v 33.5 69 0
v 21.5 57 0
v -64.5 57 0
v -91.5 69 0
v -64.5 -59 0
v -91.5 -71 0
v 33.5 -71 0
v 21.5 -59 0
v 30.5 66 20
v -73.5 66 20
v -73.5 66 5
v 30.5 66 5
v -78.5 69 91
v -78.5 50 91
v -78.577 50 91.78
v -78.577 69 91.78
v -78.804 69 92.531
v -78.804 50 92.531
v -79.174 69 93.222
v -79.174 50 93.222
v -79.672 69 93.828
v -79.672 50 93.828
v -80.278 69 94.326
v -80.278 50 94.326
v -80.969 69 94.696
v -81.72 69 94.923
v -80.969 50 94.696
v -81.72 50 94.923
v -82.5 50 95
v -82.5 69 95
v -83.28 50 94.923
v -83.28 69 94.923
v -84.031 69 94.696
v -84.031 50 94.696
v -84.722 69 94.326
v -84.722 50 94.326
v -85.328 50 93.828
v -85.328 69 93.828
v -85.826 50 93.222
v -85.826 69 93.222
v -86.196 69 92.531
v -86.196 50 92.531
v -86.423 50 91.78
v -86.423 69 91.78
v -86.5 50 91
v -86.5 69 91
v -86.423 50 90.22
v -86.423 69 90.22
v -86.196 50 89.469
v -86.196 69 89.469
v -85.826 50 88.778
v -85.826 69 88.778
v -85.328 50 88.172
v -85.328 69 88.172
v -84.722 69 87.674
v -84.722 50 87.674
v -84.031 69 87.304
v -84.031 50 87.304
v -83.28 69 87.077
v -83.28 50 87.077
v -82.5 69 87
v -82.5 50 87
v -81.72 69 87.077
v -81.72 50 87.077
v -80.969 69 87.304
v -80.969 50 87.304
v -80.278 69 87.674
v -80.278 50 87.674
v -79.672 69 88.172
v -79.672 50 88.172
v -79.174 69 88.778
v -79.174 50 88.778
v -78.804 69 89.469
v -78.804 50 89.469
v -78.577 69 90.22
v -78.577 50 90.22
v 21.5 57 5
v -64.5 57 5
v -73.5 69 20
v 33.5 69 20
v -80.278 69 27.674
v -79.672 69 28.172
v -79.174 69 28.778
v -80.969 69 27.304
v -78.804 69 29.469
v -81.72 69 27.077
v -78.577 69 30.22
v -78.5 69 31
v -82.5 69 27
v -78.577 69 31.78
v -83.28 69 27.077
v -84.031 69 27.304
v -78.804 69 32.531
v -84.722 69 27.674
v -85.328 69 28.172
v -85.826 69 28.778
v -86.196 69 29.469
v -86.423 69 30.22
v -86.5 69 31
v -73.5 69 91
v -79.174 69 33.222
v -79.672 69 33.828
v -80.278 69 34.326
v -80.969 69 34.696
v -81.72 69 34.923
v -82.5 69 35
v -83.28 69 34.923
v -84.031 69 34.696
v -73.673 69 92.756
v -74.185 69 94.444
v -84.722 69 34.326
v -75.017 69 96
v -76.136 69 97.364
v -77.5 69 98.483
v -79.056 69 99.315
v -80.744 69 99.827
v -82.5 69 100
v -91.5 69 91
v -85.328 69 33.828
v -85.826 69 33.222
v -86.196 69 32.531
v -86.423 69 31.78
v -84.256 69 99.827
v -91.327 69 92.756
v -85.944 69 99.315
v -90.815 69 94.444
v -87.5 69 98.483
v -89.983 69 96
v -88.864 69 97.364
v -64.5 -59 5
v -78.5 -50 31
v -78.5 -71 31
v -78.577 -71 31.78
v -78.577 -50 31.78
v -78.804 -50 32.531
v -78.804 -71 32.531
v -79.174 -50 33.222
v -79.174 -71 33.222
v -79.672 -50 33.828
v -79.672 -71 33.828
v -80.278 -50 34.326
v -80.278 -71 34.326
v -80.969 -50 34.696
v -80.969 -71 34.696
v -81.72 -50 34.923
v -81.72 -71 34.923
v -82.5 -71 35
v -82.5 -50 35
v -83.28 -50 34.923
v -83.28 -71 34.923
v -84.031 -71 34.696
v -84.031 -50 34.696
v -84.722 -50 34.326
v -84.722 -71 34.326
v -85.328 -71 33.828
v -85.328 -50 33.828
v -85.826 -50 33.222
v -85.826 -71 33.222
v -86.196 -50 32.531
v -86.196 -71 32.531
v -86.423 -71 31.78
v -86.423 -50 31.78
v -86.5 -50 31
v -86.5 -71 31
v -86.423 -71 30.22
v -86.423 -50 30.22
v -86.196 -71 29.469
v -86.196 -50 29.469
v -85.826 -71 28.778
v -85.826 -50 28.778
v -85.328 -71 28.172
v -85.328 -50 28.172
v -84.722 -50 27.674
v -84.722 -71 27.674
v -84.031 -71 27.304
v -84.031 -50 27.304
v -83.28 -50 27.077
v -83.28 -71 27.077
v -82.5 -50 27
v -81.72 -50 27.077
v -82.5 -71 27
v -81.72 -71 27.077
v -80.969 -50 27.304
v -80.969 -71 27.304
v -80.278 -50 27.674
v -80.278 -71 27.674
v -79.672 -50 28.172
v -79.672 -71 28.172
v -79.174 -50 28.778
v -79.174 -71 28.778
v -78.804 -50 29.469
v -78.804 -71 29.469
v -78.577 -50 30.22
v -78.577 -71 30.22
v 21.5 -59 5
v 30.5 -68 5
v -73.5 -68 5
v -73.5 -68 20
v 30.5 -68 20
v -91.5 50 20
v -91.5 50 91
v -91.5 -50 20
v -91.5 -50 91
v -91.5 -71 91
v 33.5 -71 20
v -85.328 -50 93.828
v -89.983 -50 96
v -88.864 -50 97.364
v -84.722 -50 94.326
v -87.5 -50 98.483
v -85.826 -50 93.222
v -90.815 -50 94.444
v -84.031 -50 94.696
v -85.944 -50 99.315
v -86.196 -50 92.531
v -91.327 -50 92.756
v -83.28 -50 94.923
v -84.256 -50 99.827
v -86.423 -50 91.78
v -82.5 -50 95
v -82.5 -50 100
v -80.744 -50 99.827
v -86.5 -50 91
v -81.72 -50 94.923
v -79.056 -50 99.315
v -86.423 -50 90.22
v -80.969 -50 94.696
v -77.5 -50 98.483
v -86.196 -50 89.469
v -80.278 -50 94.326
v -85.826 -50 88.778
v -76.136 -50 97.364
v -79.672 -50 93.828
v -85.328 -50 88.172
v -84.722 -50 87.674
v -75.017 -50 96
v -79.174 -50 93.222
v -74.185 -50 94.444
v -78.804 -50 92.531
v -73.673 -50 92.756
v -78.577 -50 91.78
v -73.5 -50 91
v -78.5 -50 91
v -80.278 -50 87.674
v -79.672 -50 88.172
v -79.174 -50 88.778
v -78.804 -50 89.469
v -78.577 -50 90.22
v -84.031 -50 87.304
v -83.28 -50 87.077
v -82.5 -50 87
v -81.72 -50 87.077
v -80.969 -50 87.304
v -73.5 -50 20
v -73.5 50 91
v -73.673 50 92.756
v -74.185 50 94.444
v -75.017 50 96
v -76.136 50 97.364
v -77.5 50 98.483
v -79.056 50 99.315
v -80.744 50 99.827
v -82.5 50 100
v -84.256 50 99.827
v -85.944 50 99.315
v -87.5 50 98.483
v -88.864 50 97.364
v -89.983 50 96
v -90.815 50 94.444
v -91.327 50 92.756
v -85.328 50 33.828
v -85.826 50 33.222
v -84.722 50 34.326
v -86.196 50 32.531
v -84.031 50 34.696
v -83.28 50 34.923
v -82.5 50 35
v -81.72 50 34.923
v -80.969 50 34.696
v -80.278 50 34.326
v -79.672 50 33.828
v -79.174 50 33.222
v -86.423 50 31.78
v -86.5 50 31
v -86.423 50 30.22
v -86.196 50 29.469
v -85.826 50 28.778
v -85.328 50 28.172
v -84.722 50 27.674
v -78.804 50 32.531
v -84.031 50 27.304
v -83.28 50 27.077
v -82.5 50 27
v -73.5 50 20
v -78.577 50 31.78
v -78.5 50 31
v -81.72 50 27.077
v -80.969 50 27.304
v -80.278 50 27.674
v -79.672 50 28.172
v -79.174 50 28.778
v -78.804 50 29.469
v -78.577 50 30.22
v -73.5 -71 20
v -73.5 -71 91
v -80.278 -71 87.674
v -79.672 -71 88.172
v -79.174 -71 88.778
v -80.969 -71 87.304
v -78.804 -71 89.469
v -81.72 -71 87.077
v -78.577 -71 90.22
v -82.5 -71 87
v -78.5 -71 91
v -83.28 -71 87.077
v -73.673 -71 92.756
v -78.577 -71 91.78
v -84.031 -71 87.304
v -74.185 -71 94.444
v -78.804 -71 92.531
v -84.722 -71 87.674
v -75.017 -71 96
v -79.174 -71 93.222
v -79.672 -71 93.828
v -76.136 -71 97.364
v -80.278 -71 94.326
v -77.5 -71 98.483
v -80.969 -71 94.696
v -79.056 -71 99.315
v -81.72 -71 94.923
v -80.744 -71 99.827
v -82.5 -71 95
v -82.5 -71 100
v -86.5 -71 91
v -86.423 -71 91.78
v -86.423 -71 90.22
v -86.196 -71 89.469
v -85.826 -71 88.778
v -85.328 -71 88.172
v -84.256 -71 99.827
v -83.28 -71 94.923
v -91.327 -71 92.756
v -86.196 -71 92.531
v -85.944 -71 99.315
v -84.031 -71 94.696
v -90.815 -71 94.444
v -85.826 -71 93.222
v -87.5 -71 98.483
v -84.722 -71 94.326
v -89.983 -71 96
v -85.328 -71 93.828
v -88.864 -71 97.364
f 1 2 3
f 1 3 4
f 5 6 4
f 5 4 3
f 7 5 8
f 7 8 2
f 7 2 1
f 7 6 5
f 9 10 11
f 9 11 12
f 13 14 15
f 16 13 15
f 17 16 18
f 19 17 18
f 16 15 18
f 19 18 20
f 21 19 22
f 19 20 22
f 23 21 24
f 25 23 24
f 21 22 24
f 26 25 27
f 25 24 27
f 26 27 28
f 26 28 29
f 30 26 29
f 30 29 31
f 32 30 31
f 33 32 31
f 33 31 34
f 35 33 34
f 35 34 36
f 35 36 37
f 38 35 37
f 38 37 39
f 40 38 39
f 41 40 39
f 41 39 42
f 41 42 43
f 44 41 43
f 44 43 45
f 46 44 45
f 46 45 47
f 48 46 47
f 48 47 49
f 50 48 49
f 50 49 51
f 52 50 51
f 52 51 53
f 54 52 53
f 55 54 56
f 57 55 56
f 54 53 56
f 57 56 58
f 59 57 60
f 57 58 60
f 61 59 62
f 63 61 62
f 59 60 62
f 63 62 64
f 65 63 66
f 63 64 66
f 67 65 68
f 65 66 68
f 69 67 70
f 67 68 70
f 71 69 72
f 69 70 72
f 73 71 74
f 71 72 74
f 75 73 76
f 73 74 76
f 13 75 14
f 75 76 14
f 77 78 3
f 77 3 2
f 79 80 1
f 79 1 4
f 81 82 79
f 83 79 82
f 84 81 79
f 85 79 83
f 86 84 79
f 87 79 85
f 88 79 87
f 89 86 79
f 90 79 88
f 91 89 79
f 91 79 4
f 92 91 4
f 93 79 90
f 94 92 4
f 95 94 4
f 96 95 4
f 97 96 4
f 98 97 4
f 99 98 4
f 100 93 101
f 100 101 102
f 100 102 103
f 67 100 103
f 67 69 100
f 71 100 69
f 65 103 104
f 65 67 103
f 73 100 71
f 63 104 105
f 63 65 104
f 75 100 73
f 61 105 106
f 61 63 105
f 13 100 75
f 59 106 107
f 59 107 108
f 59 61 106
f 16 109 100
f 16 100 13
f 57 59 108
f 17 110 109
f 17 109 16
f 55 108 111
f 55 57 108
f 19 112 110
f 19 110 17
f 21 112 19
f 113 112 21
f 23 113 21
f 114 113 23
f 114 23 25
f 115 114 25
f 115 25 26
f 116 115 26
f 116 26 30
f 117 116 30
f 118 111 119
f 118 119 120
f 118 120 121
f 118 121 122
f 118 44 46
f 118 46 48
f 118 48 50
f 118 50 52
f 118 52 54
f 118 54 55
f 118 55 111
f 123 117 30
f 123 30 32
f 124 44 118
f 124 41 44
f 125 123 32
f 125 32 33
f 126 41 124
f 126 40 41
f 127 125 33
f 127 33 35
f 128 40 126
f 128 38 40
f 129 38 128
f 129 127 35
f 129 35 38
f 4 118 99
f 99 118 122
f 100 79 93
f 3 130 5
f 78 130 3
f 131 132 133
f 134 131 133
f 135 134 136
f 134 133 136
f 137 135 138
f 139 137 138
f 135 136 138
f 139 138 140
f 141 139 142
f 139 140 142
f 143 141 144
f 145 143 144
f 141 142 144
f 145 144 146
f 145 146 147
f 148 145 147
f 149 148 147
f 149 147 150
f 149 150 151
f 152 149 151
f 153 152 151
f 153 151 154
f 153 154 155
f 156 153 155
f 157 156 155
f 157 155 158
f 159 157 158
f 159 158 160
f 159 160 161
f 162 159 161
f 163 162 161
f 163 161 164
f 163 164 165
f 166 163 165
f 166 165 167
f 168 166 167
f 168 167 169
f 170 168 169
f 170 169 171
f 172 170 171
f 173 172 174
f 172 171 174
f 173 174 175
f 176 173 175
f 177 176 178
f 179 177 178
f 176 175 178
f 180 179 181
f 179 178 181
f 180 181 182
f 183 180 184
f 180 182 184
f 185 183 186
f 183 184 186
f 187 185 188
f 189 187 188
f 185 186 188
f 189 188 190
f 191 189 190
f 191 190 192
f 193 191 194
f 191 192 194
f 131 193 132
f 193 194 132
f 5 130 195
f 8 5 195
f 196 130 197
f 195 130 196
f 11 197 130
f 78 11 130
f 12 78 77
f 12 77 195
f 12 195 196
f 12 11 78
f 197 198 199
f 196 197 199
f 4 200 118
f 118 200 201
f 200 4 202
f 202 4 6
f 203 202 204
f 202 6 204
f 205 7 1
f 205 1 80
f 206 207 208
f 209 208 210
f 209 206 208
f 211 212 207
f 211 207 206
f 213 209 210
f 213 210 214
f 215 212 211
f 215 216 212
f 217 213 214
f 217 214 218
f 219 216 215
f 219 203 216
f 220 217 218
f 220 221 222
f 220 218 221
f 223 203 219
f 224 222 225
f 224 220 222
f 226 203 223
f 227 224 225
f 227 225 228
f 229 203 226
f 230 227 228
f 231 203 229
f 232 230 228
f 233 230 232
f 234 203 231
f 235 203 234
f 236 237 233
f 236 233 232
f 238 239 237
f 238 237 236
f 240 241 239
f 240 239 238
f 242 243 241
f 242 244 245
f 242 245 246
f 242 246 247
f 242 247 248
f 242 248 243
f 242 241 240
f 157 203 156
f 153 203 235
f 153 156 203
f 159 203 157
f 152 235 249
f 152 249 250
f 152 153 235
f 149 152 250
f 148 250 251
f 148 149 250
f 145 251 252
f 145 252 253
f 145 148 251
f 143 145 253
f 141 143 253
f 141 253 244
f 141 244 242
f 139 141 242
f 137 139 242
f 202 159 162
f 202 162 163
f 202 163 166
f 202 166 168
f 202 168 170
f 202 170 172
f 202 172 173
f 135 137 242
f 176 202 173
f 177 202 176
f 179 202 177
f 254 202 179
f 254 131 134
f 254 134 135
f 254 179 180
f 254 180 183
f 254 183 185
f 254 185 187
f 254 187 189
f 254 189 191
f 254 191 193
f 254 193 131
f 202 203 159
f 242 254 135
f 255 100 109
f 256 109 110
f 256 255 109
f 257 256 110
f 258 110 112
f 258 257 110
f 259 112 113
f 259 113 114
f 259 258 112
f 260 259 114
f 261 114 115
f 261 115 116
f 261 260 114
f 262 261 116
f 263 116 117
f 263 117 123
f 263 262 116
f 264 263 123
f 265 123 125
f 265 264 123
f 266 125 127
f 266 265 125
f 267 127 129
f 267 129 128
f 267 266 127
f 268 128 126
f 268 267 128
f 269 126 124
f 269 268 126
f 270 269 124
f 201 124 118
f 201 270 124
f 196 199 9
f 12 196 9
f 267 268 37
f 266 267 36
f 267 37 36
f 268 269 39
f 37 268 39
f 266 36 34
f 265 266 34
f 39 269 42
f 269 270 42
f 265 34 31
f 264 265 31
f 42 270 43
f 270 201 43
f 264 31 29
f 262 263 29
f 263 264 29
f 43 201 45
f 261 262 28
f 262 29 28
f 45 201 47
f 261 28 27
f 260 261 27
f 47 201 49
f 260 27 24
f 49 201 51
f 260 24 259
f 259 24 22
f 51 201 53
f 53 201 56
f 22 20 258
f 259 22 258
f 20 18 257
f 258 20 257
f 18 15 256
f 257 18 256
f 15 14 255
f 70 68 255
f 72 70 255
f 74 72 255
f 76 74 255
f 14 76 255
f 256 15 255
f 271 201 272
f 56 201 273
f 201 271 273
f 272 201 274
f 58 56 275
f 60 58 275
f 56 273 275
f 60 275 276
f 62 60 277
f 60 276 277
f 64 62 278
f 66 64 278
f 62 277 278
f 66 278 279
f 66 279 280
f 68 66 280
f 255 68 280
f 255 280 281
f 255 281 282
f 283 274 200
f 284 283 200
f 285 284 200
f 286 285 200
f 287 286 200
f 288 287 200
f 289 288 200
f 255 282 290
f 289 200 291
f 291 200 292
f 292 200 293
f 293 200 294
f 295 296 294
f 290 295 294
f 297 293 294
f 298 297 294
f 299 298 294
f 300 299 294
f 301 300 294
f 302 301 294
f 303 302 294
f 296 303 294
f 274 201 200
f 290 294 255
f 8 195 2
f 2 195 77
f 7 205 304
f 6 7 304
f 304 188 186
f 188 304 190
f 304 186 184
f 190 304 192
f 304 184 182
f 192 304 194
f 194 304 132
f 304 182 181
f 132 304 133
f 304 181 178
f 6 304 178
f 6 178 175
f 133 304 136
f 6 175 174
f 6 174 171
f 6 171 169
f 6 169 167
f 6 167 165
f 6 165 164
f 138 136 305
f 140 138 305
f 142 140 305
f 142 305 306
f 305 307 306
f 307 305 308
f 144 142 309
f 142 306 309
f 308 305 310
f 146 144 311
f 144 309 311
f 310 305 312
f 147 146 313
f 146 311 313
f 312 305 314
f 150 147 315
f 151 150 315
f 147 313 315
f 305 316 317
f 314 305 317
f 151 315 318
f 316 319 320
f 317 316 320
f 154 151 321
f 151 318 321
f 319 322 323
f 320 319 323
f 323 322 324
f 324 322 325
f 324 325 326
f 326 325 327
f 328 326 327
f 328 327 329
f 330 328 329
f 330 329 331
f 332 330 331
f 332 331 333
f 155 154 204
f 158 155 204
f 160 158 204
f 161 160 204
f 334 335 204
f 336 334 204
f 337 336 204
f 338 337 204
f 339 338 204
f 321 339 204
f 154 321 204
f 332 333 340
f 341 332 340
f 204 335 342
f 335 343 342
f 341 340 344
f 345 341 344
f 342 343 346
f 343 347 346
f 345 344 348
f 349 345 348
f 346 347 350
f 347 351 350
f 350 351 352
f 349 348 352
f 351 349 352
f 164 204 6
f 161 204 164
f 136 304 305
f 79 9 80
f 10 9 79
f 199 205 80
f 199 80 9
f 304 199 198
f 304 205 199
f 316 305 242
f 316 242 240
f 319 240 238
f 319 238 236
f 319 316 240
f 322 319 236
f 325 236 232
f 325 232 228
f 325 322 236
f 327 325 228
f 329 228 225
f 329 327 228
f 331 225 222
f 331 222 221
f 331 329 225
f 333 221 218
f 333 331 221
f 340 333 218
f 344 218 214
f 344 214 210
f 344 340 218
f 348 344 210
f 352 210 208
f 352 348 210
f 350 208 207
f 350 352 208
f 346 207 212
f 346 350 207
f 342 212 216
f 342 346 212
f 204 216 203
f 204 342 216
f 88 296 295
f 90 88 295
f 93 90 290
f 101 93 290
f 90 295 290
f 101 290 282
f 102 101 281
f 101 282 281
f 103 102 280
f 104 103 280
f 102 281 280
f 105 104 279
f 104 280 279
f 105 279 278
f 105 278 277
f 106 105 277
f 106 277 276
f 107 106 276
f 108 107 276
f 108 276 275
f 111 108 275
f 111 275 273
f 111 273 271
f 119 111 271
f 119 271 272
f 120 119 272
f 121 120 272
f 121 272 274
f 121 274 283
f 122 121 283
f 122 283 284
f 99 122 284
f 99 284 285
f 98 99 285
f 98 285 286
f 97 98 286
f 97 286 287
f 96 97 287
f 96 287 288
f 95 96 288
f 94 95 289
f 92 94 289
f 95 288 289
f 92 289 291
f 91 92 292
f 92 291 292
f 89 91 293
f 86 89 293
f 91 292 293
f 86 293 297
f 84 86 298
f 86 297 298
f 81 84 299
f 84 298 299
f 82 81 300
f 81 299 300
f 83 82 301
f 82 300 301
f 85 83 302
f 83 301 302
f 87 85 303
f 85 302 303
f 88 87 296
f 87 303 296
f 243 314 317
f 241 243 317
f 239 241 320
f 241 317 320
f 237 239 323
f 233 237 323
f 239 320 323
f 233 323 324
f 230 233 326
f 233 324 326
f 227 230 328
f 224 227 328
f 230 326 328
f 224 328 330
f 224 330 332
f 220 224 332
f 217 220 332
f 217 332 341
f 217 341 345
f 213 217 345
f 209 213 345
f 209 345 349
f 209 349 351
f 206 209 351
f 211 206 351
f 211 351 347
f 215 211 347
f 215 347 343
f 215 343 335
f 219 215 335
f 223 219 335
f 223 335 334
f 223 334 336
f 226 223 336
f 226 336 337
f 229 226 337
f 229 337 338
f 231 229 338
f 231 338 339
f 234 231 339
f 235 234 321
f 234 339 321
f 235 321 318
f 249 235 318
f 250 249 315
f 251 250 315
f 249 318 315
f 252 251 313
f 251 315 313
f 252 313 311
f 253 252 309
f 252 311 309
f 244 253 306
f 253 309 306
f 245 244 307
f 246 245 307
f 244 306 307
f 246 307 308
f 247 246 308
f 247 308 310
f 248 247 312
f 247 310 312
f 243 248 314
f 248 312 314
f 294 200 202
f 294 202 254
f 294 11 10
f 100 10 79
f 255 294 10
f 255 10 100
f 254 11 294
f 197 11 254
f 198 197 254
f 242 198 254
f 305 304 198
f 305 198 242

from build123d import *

# Parameters (mm, degrees)
BOX_W        = 18
BOX_H        = 100
BOX_DEPTH    = 80
SKETCH001_W  = 104
SKETCH001_H  = 134
PAD_DEPTH    = 15
SKETCH002_W  = 86
SKETCH002_H  = 116
PAD002_DEPTH = 5
SKETCH_R     = 4
PAD001_DEPTH = 140


with BuildPart() as cube:
    # Box → Box (new body)
    with BuildSketch(Plane(origin=(-91.5, -50, 20), x_dir=(1, 0, 0), z_dir=(0, 0, 1))):
        with Locations((9, 50)):
            Rectangle(BOX_W, BOX_H)
    extrude(amount=BOX_DEPTH)


with BuildPart() as baseframe:
    # Sketch001 → Pad (new body)
    with BuildSketch(Plane.XY.offset(20)):
        with Locations((-21.5, -1)):
            Rectangle(SKETCH001_W, SKETCH001_H)
    extrude(amount=-PAD_DEPTH)


with BuildPart() as cutblock:
    # Sketch002 → Pad002 (new body)
    with BuildSketch(Plane.XY.offset(5)):
        with Locations((-21.5, -1)):
            Rectangle(SKETCH002_W, SKETCH002_H)
    extrude(amount=-PAD002_DEPTH)

    # Fusion: union BaseFrame
    add(baseframe.part)


with BuildPart() as cut001:
    # Sketch → Pad001 (new body)
    with BuildSketch(Plane(origin=(0, -71, 20), x_dir=(1, 0, 0), z_dir=(0, -1, 0))):
        with BuildLine():
            Line((-91.5, -20), (-91.5, 71.000001))
            ThreePointArc((-73.5, 71.000001), (-82.5, 80), (-91.5, 71.000001))
            Line((-73.5, 0), (-73.5, 71.000001))
            Line((33.5, 0), (-73.5, 0))
            Line((33.5, -20), (33.5, 0))
            Line((-91.5, -20), (33.5, -20))
        make_face()
        with Locations((-82.5, 71)):
            Circle(SKETCH_R, mode=Mode.SUBTRACT)
        with Locations((-82.5, 11)):
            Circle(SKETCH_R, mode=Mode.SUBTRACT)
    extrude(amount=-PAD001_DEPTH)

    # Cut: cut CutBlock
    add(cutblock.part, mode=Mode.SUBTRACT)

    # Cut001: cut Cube
    add(cube.part, mode=Mode.SUBTRACT)


solid = cut001.part
